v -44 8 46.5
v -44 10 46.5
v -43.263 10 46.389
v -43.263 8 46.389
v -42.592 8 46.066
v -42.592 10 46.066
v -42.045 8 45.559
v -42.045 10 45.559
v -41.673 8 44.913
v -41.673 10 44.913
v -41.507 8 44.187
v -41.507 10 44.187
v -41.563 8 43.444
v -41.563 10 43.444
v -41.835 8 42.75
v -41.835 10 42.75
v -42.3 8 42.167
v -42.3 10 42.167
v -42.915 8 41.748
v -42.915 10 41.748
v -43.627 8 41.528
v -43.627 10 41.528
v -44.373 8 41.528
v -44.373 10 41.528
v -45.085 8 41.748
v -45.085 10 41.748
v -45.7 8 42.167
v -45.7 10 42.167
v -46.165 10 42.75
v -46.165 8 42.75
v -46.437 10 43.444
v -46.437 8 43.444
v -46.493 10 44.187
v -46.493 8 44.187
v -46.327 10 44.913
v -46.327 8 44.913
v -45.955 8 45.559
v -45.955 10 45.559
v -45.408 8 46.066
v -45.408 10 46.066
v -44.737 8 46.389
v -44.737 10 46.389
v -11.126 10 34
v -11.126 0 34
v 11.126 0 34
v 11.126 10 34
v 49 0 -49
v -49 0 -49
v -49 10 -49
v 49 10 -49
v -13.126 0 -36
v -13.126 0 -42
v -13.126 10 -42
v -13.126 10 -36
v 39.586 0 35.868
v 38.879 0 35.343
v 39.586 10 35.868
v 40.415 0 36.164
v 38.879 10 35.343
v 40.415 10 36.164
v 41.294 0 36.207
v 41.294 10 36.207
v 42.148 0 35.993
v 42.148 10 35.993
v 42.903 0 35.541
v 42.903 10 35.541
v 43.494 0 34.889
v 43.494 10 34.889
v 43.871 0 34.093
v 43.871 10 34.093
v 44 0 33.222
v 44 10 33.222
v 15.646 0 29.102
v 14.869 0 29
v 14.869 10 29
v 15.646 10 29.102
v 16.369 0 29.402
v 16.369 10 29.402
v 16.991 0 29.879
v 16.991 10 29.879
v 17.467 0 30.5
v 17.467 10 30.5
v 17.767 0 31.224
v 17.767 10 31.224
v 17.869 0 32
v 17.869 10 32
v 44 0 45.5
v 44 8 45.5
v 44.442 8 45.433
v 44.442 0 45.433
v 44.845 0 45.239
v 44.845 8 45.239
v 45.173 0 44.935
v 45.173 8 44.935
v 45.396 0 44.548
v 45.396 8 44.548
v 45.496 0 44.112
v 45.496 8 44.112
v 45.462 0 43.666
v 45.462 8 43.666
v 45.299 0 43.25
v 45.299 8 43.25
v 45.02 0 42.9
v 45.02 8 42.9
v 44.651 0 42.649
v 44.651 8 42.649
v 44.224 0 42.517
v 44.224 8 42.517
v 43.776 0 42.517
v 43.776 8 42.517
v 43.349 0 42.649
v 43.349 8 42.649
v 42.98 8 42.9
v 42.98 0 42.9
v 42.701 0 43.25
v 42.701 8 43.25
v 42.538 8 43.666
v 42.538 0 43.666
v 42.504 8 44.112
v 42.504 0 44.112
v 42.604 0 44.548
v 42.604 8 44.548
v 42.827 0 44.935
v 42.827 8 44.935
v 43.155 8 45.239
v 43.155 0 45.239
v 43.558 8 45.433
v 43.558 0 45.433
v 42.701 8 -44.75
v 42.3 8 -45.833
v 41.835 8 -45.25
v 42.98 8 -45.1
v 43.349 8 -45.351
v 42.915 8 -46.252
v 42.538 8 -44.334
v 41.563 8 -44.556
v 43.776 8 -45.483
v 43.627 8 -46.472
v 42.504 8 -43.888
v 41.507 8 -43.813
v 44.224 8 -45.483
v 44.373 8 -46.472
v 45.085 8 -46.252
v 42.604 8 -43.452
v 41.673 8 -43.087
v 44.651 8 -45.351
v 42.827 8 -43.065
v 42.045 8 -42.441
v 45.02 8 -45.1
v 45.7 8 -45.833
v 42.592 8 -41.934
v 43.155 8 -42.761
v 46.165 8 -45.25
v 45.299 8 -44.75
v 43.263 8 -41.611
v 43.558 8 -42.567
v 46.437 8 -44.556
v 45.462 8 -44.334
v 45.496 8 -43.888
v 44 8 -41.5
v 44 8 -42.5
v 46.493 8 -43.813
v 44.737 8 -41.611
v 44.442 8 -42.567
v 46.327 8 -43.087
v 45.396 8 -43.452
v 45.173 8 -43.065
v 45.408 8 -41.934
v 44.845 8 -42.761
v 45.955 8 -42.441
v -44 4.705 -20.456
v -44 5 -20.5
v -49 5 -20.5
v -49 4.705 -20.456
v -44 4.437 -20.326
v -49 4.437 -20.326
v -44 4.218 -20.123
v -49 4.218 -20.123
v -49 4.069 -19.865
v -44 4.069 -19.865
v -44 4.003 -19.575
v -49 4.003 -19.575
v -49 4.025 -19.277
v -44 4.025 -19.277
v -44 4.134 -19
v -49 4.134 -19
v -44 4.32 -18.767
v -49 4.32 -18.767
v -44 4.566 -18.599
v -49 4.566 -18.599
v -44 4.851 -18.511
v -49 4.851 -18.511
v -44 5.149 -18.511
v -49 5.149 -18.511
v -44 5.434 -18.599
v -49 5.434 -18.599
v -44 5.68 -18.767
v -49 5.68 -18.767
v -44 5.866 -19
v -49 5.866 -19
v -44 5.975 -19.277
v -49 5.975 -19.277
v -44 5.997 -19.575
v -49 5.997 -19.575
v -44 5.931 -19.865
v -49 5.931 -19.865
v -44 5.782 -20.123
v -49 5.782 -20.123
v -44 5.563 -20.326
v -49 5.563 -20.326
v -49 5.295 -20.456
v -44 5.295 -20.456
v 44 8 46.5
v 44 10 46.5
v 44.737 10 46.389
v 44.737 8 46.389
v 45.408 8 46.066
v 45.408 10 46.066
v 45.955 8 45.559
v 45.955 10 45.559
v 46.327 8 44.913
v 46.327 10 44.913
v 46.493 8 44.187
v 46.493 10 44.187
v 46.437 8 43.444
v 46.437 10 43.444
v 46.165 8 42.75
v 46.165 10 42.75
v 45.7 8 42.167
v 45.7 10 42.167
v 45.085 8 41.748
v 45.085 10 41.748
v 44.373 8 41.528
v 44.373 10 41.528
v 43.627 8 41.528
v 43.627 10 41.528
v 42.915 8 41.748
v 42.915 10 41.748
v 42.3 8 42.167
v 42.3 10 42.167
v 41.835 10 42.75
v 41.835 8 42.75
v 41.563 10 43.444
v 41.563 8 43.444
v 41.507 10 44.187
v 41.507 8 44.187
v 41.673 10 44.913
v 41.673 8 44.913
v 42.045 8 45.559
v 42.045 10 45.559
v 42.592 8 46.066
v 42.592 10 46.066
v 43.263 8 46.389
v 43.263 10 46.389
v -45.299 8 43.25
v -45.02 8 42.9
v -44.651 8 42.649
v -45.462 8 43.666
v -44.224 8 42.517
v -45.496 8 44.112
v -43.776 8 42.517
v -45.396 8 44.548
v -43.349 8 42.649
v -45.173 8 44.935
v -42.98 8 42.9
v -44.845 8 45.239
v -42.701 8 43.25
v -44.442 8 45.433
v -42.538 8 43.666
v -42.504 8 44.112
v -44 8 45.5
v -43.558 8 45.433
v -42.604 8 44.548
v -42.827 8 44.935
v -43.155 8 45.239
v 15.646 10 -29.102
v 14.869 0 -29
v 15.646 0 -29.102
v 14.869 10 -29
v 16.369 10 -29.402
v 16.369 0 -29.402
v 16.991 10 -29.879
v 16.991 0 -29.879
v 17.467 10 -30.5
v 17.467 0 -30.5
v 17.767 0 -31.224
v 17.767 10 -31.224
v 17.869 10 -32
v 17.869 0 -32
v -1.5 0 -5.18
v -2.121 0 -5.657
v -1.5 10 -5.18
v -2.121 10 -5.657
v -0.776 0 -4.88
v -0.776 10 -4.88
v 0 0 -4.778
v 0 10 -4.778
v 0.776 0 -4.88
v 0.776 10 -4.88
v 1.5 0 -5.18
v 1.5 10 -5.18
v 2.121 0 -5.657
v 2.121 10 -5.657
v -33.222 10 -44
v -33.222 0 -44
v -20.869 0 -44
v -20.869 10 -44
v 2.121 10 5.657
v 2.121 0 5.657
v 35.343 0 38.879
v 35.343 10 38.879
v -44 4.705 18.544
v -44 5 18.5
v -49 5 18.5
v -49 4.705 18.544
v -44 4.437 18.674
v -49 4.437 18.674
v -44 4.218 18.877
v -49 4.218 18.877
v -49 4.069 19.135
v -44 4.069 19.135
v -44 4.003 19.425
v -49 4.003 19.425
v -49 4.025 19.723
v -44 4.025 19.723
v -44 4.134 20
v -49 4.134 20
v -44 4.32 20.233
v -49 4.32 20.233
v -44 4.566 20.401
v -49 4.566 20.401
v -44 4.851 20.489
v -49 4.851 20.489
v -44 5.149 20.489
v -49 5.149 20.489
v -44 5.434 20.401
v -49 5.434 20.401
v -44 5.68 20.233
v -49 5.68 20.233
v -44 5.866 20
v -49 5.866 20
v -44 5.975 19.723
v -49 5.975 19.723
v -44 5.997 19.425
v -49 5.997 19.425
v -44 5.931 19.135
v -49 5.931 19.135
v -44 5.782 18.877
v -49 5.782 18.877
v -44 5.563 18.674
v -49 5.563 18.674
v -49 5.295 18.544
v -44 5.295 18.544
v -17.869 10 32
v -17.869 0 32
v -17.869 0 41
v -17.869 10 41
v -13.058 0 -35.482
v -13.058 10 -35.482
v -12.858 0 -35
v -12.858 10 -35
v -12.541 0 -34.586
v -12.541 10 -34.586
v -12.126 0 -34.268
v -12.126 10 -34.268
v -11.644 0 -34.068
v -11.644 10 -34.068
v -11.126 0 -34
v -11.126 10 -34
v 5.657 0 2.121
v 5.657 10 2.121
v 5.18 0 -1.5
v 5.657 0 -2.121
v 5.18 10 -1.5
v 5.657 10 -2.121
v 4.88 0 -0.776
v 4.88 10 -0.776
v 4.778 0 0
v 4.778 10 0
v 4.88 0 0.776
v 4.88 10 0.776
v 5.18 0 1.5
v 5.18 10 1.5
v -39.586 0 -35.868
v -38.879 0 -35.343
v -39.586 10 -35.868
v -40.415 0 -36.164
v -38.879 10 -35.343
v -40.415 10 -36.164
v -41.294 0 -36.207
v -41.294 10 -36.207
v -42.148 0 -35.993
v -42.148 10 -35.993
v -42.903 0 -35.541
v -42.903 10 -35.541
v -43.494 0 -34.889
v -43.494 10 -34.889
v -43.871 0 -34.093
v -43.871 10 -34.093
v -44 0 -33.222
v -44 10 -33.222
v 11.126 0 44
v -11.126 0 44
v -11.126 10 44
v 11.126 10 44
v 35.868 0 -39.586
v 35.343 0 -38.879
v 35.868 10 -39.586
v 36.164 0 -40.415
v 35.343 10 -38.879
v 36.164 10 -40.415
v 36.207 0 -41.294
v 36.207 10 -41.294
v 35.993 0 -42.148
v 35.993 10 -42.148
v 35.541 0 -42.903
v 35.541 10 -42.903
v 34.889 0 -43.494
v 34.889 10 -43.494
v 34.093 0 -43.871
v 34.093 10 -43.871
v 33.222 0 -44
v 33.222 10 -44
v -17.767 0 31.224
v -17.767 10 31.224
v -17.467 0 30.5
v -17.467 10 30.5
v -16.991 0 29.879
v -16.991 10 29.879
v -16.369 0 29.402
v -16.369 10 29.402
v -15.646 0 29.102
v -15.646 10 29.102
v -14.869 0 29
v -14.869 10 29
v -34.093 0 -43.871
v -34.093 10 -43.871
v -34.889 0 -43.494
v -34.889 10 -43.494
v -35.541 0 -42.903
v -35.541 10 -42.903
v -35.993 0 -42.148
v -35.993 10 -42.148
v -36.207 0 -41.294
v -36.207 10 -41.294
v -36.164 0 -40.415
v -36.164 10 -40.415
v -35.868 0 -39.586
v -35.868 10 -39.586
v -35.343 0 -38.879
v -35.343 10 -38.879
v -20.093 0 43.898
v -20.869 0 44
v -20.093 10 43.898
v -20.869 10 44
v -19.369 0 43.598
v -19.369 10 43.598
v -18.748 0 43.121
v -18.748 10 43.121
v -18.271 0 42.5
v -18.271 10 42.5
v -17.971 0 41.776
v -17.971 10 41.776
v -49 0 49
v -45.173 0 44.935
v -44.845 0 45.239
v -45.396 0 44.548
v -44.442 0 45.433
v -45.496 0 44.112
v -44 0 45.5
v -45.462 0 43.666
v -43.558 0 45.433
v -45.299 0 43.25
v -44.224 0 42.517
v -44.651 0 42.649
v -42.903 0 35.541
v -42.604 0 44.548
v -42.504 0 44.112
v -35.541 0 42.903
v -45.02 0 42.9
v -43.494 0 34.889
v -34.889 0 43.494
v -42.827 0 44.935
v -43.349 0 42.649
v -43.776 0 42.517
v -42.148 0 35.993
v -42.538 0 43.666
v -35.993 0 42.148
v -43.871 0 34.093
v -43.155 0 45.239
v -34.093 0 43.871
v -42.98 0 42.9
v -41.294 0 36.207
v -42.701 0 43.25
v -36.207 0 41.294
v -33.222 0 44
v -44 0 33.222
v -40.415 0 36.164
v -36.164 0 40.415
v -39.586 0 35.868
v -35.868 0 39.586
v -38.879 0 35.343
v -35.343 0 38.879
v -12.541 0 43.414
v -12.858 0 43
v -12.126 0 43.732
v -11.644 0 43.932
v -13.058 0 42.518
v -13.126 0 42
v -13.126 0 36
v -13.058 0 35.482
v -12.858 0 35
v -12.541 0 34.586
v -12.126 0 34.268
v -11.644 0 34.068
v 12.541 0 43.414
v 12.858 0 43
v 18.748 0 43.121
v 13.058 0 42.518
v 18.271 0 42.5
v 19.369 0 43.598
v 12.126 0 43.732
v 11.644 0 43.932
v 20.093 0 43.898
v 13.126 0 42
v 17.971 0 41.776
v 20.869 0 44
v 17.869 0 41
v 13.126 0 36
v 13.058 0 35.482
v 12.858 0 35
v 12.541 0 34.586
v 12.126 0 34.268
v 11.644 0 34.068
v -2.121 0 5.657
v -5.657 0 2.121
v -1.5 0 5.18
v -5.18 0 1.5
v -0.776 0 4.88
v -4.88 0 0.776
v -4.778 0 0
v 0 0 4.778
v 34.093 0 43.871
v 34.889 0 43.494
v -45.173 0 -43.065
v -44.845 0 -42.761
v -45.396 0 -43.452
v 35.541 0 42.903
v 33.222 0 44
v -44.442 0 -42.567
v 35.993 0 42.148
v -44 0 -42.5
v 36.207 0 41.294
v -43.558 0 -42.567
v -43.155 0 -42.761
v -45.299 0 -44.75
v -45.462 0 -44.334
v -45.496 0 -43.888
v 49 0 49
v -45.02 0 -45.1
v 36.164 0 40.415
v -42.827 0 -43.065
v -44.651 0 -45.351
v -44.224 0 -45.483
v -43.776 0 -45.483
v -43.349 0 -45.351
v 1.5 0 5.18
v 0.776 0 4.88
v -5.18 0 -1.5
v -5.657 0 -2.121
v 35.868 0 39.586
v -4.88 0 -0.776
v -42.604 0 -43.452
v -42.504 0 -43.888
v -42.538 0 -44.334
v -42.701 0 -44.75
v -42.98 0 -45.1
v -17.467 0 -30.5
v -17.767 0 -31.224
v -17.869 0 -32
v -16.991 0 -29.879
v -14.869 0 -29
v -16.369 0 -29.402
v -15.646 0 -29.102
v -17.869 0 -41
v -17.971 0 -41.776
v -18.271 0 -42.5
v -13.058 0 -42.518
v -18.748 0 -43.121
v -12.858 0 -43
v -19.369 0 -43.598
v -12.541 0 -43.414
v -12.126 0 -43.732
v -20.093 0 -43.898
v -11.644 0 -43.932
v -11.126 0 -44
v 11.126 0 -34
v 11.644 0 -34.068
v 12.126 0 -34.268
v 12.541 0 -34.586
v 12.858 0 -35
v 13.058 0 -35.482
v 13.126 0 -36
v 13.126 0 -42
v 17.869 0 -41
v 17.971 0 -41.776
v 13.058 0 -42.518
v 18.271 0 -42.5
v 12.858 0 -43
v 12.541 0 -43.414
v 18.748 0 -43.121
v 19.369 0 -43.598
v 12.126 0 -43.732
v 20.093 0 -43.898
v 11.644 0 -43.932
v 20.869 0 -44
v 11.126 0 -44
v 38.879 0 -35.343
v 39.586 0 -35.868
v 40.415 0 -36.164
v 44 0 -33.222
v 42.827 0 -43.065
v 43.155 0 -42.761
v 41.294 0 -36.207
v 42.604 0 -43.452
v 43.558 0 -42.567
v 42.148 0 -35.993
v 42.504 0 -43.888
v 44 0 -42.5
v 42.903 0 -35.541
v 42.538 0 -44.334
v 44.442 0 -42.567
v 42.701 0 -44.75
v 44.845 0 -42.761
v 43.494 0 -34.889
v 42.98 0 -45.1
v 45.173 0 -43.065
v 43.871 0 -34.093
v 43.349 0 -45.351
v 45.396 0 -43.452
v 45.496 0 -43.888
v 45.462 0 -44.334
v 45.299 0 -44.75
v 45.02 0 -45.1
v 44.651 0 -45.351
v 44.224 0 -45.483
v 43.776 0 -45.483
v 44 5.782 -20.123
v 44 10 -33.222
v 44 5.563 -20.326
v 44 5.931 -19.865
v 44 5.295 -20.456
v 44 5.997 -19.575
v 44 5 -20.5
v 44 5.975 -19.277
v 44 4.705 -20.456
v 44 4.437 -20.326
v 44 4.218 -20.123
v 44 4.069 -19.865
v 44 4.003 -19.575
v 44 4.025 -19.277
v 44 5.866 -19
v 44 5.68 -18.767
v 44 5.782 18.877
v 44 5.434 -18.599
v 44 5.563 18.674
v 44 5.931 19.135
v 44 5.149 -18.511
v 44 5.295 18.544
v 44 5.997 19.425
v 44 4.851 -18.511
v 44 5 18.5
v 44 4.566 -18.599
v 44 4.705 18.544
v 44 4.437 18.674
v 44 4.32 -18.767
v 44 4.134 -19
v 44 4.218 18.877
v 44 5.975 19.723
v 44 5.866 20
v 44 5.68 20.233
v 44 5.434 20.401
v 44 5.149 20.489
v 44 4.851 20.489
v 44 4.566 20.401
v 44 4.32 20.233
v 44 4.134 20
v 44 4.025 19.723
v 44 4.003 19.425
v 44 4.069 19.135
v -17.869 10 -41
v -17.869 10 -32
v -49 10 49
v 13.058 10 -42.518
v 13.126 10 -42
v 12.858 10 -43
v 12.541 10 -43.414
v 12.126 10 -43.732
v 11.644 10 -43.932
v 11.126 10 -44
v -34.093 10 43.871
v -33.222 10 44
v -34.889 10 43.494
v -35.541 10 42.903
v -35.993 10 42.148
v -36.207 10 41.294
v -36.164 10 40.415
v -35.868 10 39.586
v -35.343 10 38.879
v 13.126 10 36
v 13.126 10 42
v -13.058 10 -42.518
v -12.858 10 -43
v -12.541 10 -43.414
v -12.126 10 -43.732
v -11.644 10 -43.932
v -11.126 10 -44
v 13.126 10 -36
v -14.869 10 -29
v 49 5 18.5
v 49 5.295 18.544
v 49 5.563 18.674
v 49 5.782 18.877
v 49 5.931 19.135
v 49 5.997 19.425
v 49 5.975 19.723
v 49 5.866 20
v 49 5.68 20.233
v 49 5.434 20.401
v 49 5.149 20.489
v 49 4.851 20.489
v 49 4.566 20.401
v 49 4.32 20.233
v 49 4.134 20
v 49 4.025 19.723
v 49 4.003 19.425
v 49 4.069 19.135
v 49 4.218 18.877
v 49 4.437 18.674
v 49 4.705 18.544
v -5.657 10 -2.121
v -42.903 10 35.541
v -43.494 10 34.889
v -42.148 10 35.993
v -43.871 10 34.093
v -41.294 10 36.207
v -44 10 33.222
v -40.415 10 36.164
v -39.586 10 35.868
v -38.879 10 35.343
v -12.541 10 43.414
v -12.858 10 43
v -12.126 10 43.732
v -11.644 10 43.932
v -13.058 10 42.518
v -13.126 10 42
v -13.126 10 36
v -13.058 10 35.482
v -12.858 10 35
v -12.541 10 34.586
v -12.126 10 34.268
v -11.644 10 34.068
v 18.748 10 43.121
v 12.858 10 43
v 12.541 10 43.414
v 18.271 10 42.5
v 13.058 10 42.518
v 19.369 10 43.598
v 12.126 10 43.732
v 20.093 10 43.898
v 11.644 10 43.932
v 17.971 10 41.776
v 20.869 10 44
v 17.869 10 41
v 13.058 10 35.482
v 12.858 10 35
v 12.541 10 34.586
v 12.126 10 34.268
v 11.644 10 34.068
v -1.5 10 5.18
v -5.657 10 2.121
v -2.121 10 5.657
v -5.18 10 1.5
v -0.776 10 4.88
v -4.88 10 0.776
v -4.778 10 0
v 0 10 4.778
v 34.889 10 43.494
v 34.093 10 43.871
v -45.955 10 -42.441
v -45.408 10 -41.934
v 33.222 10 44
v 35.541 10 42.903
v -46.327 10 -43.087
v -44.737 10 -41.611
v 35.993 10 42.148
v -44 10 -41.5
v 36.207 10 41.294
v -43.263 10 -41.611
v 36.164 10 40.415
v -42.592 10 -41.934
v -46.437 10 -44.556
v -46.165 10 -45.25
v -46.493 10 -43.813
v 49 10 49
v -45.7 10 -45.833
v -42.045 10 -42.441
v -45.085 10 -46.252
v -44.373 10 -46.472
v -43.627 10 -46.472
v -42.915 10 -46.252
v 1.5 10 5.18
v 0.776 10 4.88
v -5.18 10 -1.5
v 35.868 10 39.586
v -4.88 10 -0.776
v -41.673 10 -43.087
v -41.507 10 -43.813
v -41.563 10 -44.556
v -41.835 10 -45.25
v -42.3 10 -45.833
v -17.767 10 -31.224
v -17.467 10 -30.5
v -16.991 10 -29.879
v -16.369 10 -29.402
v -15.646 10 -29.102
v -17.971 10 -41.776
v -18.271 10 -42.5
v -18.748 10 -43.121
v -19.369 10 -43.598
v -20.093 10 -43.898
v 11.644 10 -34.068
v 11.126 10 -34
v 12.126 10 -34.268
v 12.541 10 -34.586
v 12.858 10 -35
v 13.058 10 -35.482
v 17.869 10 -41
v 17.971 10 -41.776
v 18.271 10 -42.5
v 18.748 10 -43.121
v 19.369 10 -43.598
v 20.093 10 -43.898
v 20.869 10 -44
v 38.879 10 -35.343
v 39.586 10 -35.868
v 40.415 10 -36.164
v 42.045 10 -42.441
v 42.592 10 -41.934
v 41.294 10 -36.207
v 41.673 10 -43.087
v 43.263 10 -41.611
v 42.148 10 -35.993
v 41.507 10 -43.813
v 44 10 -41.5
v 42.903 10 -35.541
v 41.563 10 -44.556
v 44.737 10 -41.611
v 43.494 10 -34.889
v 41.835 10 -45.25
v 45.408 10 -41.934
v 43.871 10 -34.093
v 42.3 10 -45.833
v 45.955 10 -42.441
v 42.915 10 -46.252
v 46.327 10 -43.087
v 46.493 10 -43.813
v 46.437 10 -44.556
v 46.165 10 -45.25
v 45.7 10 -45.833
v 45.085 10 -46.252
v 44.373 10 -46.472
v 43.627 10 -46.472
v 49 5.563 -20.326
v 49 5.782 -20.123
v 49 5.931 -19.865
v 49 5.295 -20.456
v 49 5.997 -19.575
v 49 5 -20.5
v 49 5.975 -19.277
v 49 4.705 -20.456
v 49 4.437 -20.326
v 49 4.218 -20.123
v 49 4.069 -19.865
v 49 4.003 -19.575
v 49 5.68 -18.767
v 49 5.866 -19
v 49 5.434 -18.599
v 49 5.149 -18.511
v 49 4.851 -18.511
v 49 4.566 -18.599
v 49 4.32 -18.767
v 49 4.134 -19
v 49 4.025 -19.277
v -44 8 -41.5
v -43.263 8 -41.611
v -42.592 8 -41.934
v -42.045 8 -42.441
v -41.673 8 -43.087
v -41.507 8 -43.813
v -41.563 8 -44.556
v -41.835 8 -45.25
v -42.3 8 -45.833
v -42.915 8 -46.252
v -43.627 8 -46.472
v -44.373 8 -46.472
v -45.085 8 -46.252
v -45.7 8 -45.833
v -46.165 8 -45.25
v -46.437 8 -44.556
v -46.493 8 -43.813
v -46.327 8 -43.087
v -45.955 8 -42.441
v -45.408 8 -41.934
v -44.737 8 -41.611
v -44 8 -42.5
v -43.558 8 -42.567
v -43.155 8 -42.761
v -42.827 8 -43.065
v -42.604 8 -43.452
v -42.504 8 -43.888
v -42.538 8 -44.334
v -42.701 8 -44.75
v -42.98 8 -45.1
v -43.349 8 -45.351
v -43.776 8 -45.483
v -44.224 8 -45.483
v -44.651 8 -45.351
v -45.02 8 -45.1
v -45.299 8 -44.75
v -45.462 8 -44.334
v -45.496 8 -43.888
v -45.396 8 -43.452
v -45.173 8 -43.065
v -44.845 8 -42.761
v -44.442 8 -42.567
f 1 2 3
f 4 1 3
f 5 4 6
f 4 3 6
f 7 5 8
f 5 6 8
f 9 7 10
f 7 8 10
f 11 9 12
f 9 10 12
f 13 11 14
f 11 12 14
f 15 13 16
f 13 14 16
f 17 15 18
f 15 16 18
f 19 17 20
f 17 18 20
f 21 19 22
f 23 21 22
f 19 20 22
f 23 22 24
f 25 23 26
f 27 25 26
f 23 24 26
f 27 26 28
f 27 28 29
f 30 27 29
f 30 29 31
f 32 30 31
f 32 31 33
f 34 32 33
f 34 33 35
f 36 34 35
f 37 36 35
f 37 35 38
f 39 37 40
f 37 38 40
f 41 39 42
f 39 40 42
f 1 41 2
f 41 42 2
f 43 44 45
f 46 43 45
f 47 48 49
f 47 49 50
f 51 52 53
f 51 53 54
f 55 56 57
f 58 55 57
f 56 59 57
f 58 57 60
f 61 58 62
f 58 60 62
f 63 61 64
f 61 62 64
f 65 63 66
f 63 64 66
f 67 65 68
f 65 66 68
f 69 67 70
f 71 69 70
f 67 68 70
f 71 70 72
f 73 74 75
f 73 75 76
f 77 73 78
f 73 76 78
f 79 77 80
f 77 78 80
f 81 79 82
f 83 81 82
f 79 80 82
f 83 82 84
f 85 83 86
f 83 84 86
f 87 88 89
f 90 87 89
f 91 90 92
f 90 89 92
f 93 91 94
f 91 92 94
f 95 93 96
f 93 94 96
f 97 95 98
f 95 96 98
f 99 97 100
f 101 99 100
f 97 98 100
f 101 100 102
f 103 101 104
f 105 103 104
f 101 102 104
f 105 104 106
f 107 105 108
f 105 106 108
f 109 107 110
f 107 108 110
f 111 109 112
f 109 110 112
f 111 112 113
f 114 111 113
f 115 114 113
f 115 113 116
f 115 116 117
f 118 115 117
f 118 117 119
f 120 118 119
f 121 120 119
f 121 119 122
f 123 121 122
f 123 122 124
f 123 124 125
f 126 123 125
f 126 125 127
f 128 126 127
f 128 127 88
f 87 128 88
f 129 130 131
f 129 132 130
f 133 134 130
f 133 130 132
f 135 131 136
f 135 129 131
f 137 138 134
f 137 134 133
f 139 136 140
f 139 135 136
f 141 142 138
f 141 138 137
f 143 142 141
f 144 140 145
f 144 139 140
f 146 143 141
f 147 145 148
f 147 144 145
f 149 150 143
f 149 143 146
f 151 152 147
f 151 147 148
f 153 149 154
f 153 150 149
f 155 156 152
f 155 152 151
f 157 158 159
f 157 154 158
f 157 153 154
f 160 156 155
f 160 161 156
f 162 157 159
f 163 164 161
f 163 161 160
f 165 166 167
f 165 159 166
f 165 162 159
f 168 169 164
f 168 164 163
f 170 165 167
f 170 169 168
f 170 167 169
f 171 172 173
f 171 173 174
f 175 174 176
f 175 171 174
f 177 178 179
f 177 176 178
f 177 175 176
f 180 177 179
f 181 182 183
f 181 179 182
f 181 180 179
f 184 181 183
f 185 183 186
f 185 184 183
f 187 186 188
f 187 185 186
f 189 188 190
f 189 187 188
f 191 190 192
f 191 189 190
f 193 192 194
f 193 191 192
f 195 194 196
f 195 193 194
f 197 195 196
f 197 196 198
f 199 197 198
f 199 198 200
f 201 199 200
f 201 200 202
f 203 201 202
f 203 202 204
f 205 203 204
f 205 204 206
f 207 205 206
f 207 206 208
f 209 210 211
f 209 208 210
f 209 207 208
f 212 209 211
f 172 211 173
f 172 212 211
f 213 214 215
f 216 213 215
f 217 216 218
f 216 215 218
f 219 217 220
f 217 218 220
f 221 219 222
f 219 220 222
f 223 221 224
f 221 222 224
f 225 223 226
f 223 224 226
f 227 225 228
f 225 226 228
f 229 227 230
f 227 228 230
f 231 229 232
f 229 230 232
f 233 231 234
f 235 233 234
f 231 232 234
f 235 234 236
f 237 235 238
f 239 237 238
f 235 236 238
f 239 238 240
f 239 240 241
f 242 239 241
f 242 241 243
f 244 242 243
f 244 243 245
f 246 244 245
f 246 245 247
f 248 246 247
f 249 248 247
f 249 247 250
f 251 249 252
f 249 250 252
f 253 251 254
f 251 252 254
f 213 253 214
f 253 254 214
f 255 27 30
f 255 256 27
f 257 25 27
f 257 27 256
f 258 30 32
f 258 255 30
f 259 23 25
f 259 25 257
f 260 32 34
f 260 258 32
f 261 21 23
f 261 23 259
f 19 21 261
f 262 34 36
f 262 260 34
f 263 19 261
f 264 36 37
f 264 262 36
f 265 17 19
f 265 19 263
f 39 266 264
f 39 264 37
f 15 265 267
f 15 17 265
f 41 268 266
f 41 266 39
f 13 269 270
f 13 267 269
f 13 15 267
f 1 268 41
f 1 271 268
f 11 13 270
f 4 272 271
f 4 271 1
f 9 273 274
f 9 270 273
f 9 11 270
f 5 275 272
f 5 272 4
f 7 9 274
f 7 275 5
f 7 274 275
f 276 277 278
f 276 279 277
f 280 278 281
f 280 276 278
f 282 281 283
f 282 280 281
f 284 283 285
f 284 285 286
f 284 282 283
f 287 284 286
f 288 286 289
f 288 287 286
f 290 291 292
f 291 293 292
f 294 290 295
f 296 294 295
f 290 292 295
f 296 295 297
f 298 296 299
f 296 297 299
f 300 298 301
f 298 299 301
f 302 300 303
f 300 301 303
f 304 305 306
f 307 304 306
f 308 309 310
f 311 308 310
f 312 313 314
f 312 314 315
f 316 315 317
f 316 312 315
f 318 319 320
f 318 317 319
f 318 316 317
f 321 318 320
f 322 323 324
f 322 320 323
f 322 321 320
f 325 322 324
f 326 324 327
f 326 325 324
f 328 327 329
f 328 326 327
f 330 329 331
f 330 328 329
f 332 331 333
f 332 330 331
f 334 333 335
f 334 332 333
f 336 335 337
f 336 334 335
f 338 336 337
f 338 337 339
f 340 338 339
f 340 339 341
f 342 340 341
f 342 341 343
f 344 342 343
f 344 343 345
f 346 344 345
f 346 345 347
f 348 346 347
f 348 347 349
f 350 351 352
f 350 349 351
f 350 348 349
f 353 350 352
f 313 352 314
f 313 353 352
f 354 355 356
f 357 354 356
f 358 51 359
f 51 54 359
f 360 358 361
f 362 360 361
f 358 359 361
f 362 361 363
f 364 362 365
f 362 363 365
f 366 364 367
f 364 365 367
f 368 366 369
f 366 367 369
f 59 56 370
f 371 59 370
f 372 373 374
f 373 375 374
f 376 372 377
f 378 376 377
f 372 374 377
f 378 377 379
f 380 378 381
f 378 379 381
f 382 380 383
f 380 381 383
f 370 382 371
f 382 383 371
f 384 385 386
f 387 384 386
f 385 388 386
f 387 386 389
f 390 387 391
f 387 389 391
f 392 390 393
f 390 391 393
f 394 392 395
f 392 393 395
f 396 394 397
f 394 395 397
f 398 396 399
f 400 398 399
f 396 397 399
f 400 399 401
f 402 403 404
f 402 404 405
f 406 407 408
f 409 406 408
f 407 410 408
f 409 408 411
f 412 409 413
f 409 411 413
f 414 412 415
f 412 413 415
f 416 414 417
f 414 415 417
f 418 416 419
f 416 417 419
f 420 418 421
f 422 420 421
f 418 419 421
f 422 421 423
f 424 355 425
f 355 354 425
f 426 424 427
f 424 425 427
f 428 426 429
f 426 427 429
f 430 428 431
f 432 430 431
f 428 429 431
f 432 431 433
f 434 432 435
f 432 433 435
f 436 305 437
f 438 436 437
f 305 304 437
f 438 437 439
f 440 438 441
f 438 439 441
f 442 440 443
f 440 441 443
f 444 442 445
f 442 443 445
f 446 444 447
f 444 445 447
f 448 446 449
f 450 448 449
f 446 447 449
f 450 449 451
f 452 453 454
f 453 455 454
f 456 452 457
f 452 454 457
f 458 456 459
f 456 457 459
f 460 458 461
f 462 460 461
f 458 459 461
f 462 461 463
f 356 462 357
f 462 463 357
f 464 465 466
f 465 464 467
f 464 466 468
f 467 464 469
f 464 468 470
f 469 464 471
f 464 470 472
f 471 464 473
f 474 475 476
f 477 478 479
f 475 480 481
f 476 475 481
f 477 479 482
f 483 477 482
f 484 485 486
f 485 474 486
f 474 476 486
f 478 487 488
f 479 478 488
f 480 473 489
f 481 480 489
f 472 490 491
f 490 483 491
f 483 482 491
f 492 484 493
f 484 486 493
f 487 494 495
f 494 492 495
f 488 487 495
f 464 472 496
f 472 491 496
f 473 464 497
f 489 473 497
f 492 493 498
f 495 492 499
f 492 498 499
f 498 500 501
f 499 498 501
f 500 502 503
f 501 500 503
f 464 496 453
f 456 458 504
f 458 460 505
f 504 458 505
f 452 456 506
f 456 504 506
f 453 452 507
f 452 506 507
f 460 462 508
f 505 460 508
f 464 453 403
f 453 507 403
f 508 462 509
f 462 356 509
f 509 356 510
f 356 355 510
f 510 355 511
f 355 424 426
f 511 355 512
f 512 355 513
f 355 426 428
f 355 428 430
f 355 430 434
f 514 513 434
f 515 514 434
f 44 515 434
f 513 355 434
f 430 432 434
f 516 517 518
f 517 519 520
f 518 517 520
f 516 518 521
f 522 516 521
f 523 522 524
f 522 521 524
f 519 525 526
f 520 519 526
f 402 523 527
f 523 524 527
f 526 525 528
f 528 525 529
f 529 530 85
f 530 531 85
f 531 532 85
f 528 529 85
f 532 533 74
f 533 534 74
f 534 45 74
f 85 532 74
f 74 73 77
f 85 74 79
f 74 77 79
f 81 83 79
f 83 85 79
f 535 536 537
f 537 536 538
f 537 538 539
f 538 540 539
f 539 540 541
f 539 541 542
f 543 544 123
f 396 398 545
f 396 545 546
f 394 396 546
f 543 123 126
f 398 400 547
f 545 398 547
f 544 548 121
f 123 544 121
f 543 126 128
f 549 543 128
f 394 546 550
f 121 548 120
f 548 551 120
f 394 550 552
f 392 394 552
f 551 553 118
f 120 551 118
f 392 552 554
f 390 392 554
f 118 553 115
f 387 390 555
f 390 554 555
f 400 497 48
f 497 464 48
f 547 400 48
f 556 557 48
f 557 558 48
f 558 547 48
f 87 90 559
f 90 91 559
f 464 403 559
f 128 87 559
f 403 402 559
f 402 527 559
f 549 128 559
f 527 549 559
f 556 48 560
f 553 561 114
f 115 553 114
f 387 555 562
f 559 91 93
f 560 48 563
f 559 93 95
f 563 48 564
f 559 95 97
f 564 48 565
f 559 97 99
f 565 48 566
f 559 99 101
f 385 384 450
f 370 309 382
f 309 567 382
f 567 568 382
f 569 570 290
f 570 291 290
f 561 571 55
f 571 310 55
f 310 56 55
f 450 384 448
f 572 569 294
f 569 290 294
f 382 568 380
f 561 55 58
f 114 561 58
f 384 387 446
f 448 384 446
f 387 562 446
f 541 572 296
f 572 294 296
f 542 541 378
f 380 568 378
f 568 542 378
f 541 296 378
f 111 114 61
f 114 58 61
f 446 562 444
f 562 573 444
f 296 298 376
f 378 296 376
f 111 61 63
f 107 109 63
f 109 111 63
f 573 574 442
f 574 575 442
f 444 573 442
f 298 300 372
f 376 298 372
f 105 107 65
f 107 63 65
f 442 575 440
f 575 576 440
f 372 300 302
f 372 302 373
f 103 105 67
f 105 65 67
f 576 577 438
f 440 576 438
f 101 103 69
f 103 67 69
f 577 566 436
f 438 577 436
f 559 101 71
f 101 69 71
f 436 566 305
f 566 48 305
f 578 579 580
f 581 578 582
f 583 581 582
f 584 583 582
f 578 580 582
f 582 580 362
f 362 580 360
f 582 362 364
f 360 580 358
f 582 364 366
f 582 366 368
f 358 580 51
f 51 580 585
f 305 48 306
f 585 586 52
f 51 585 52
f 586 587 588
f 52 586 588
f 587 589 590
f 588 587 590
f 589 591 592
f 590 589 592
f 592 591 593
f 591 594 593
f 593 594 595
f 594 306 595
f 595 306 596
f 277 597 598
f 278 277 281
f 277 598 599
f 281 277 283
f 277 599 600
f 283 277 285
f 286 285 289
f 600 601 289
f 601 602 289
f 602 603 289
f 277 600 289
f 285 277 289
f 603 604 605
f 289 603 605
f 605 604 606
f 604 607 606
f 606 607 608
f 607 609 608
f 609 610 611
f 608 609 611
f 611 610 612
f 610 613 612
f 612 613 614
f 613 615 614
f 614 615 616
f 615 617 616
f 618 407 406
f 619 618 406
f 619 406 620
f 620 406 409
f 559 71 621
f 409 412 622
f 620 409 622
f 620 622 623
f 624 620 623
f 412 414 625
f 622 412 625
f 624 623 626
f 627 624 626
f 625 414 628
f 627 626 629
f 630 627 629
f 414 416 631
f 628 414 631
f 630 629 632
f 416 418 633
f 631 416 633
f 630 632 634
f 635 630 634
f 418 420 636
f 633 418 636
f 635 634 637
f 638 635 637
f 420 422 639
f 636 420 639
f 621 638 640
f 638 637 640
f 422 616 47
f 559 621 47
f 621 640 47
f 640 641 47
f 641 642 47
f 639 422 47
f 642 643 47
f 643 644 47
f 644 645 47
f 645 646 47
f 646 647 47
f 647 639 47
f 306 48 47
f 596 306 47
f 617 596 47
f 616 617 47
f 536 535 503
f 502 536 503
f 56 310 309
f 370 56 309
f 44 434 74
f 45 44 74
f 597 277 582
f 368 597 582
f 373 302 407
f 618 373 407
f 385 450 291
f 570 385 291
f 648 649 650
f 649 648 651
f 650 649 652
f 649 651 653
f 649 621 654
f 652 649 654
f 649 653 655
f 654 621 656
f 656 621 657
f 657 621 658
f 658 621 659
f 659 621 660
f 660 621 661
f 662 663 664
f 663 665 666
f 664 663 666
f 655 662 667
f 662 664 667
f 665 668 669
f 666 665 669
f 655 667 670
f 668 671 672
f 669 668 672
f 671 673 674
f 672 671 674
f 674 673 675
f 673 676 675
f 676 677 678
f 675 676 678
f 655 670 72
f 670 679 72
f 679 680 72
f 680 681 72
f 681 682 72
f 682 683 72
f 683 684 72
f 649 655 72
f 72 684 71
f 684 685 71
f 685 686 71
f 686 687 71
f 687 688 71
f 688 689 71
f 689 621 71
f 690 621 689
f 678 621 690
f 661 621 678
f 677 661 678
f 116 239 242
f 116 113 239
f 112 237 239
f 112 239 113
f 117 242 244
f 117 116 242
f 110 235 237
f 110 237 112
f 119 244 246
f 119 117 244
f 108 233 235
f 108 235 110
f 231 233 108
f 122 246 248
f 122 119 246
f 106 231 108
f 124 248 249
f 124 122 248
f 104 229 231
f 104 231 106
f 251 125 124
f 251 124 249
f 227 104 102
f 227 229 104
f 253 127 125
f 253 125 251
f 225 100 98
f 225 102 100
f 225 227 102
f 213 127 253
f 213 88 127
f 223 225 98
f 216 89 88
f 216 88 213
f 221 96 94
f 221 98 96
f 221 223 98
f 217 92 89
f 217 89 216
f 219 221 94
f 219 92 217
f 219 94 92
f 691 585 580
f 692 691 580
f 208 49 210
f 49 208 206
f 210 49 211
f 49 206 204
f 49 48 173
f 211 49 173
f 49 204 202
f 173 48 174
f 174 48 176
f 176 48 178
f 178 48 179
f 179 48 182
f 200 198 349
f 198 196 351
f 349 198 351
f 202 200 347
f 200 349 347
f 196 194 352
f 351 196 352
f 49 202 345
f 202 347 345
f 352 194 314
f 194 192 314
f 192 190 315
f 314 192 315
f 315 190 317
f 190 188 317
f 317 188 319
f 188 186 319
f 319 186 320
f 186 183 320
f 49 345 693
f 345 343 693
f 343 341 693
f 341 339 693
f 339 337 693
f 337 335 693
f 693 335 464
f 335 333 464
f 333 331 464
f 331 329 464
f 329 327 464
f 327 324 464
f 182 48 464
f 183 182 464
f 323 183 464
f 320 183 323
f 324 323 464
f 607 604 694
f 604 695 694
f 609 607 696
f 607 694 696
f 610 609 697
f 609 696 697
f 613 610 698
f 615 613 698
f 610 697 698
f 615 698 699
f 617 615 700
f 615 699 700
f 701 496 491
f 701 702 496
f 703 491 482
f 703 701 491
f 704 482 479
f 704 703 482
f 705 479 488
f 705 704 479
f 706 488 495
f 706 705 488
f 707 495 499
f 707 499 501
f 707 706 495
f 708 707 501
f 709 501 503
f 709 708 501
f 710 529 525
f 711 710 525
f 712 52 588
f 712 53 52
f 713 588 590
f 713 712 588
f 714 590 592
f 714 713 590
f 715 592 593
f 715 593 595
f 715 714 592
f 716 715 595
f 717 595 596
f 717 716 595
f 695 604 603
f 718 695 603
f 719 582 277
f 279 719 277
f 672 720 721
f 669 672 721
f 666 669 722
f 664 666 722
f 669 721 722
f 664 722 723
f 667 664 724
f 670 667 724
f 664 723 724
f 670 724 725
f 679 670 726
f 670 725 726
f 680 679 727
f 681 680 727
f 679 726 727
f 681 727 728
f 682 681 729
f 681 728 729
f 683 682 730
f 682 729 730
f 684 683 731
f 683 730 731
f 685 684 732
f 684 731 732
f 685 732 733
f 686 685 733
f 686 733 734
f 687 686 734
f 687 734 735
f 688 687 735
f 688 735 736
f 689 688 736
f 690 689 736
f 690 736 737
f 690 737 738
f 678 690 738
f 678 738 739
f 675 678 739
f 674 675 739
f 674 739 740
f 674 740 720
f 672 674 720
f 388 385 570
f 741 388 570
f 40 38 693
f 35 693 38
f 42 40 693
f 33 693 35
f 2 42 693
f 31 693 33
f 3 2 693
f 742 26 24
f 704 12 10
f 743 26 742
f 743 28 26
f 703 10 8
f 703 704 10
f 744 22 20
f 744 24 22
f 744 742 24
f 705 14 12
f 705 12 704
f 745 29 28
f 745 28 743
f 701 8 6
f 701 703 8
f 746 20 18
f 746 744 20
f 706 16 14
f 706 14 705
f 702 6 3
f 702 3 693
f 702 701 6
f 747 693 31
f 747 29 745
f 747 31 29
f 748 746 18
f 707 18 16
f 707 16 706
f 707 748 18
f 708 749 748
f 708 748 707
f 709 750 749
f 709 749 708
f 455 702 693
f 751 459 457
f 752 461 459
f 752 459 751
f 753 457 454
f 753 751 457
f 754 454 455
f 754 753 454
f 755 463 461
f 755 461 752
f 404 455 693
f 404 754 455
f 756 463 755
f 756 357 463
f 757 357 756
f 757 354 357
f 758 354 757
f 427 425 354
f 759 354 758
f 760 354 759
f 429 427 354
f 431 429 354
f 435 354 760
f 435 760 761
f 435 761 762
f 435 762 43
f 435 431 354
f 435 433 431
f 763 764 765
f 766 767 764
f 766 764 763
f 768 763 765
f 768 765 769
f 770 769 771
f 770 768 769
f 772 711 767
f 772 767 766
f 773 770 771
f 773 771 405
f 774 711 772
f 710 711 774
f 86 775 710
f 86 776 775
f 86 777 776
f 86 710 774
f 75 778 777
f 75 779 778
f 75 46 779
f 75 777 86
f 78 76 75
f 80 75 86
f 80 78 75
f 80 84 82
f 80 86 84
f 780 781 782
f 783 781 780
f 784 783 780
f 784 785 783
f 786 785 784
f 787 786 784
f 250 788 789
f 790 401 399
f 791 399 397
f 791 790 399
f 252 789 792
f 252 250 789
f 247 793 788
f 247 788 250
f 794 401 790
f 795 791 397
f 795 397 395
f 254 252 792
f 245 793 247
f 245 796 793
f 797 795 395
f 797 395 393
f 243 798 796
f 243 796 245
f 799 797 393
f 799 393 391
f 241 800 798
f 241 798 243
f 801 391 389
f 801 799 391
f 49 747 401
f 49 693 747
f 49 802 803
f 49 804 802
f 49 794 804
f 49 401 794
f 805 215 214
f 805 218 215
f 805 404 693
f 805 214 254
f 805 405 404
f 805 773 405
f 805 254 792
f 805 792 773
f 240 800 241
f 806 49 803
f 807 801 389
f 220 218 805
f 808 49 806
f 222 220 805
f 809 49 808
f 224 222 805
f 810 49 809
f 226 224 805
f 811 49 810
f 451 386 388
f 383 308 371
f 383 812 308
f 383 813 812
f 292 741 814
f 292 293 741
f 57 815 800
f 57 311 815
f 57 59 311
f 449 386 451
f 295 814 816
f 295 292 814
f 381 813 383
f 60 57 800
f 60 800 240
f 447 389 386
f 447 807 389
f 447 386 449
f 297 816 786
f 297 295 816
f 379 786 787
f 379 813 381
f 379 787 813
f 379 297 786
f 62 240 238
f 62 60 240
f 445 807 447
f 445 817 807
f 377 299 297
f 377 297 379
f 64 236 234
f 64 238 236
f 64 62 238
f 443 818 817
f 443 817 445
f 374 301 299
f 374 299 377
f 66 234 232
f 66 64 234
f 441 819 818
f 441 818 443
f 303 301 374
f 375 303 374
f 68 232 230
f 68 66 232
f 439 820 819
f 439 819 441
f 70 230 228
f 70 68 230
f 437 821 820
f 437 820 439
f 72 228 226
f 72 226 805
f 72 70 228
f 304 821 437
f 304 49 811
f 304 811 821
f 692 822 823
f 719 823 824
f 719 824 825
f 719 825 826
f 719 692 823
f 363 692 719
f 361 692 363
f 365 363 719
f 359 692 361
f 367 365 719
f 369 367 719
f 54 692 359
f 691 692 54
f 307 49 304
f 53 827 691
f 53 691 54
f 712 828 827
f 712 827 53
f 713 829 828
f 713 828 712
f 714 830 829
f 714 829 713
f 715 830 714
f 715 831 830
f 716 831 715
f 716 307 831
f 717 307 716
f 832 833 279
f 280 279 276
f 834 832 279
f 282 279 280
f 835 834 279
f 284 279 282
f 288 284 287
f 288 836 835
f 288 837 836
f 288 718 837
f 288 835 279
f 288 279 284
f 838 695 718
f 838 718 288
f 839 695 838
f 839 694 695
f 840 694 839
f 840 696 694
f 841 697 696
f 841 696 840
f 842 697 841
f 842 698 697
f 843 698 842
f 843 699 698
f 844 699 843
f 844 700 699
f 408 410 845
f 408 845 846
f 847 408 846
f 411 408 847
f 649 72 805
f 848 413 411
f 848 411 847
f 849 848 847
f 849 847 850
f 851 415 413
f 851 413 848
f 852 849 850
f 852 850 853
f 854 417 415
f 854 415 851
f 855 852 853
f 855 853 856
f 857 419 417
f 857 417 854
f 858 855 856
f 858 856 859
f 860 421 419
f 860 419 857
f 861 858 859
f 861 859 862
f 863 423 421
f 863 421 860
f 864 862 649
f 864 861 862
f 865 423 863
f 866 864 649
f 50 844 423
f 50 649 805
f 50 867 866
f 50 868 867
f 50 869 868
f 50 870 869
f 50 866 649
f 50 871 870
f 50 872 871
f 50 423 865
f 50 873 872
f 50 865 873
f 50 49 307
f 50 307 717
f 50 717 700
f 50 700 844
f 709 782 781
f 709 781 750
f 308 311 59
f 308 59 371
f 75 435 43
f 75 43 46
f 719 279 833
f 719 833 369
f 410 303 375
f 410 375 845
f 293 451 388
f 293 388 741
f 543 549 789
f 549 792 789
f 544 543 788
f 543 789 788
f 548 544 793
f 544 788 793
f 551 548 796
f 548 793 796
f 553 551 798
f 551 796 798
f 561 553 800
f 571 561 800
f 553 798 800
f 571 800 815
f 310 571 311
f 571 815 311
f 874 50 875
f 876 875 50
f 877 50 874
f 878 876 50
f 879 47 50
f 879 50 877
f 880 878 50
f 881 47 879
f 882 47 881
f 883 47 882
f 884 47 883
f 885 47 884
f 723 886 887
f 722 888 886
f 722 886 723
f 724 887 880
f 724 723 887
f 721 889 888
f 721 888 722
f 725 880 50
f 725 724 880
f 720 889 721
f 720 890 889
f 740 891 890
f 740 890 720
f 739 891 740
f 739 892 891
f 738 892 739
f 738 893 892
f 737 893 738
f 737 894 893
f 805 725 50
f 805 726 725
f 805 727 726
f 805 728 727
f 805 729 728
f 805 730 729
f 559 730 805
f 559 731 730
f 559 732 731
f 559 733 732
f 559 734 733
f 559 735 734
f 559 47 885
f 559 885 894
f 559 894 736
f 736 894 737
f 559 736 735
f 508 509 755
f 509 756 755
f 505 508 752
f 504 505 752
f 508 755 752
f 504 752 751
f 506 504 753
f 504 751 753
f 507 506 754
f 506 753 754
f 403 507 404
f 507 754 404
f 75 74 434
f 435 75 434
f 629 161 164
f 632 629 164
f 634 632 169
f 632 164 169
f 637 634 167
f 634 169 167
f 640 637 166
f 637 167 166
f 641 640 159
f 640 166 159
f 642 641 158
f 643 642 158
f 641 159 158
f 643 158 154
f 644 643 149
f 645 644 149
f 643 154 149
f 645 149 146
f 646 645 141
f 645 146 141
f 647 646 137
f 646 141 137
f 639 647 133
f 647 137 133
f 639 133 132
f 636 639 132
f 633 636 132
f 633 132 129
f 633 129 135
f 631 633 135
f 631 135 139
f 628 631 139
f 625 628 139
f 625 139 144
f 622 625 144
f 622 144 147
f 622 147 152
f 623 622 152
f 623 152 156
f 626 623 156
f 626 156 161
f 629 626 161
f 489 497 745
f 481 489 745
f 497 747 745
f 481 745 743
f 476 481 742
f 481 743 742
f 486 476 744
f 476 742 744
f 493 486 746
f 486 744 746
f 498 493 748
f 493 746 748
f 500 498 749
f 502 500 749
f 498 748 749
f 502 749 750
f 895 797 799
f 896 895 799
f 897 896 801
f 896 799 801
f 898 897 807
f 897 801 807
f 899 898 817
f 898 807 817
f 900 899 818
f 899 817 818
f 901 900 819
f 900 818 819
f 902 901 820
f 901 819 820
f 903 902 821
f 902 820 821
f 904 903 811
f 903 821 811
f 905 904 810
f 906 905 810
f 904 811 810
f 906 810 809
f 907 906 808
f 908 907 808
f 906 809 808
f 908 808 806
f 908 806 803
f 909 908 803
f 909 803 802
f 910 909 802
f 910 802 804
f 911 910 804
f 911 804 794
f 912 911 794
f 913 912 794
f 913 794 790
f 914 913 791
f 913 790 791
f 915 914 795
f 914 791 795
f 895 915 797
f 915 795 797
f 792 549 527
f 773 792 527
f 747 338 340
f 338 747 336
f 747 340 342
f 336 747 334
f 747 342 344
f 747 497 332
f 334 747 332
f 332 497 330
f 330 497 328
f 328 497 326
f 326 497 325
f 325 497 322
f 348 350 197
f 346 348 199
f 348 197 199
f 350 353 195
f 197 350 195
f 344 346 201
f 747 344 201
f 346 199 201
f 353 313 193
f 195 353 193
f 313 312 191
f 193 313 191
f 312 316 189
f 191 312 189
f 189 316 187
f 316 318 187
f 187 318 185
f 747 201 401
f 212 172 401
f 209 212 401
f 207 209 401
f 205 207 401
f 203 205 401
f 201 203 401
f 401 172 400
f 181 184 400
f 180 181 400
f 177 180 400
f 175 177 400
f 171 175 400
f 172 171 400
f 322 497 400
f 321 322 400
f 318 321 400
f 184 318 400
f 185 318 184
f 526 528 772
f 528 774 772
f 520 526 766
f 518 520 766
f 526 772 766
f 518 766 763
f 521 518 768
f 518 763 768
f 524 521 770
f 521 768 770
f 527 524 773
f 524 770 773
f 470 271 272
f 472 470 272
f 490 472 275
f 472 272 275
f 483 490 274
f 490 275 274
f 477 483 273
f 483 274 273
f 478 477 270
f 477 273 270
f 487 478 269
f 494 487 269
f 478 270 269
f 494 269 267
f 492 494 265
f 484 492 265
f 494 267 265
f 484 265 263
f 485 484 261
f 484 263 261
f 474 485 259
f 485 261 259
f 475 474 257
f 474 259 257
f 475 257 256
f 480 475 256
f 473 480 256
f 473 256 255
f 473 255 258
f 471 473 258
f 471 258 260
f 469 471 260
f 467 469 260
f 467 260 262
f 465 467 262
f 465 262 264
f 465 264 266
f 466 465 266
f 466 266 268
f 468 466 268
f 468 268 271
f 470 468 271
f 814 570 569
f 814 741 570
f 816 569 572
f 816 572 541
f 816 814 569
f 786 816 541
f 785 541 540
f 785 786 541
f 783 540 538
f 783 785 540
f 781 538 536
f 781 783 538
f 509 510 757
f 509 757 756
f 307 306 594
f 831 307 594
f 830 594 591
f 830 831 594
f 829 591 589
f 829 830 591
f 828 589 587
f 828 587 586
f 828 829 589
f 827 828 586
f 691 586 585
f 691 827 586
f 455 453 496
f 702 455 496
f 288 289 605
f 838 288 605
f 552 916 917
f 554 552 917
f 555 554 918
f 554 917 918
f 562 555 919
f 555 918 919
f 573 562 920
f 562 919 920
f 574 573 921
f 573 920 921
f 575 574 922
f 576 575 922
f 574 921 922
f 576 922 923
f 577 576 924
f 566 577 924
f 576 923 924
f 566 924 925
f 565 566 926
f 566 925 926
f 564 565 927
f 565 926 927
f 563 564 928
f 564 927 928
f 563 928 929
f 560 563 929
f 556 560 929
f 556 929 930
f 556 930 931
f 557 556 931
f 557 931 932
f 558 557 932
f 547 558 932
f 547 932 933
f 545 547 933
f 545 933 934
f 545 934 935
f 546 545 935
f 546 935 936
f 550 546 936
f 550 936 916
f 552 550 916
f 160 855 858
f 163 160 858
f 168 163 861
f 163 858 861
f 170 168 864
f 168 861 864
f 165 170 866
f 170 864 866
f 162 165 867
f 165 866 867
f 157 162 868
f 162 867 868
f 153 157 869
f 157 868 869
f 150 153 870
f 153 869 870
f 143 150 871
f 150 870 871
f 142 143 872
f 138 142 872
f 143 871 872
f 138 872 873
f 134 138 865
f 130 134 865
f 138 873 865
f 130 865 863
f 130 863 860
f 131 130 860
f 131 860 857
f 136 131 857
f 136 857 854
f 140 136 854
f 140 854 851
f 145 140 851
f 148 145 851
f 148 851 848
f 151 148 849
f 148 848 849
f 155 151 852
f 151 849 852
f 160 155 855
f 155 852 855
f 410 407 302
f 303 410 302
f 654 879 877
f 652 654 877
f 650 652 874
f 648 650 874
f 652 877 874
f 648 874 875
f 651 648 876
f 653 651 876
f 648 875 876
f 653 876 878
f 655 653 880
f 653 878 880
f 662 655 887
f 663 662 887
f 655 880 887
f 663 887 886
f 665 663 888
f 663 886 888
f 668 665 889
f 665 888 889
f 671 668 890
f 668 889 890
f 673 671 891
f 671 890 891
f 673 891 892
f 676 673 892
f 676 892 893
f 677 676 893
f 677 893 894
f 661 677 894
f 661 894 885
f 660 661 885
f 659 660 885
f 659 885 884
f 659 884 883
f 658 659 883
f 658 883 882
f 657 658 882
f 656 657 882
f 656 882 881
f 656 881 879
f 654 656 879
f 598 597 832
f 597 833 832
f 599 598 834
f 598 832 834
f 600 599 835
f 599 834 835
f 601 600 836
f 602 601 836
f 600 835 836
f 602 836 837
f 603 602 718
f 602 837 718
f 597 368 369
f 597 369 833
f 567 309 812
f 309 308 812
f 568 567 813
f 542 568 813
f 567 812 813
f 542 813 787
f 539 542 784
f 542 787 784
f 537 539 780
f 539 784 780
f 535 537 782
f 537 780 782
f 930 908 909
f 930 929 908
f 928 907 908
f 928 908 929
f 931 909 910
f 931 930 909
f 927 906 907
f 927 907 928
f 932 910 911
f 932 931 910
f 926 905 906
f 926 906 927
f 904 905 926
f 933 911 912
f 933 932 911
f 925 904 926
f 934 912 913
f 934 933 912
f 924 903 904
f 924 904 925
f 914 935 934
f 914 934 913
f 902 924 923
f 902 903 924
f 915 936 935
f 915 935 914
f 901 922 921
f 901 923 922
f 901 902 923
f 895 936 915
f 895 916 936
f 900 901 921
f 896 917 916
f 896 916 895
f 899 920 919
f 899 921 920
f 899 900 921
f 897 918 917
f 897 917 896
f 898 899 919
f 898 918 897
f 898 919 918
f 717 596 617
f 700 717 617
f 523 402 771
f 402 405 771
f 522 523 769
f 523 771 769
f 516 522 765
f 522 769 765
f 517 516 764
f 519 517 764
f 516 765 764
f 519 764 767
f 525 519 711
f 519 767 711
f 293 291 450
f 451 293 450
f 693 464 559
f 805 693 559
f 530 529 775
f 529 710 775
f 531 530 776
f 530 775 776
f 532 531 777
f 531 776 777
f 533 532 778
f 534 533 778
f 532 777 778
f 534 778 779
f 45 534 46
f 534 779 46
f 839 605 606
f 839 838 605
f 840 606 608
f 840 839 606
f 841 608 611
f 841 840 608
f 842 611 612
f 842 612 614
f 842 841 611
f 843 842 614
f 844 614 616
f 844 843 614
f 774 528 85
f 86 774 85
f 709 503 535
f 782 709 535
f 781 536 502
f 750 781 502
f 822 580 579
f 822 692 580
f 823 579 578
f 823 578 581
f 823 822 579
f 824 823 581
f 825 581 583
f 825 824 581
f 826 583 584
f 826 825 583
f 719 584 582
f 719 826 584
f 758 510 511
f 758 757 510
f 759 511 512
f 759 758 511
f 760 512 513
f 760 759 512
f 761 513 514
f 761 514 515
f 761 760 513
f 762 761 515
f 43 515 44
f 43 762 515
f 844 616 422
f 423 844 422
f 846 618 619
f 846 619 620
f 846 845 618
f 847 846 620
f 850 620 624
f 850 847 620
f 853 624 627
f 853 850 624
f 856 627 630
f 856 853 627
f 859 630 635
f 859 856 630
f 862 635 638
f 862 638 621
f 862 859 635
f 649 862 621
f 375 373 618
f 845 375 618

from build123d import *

# Parameters (mm, degrees)
SKETCH1_W           = 106
SKETCH1_H           = 106
BOSS_EXTRUDE1_DEPTH = 10
CUT_EXTRUDE9_DEPTH  = 1.5
SKETCH18_W          = 106
SKETCH18_H          = 106
SKETCH18_W_2        = 100
SKETCH18_H_2        = 100
CUT_EXTRUDE14_DEPTH = 10
SKETCH20_R          = 1
CUT_EXTRUDE15_DEPTH = 8
CUT_EXTRUDE16_START = -8
SKETCH21_R          = 1
CUT_EXTRUDE16_DEPTH = 8
SKETCH23_W          = 100
SKETCH23_H          = 100
SKETCH23_W_2        = 98
SKETCH23_H_2        = 98
CUT_EXTRUDE17_DEPTH = 10
SKETCH17_W          = 26.25282414
SKETCH17_H          = 10
CUT_EXTRUDE19_DEPTH = 10
FILLET2_R           = 3
FILLET3_R           = 3
FILLET4_R           = 2
SKETCH26_R          = 1.5
CUT_EXTRUDE20_DEPTH = 10
SKETCH27_R          = 2.5
CUT_EXTRUDE21_DEPTH = 2


with BuildPart() as part:
    # Sketch1 → Boss-Extrude1 (new body)
    with BuildSketch(Plane(origin=(0, 0, 0), x_dir=(1, 0, 0), z_dir=(0, 1, 0))):
        Rectangle(SKETCH1_W, SKETCH1_H)
    extrude(amount=BOSS_EXTRUDE1_DEPTH)

    # Sketch12 → Cut-Extrude9 (cut)
    with BuildSketch(Plane(origin=(53, 0, 0), x_dir=(0, 0, -1), z_dir=(1, 0, 0))):
        with BuildLine():
            ThreePointArc((-17.75, 5), (-18.262563133, 6.237436867), (-19.5, 6.75))
            Line((-19.5, 6.75), (-19.5, 3.25))
            ThreePointArc((-19.5, 3.25), (-18.262563133, 3.762563133), (-17.75, 5))
        make_face()
        with BuildLine():
            Line((-19.5, 3.25), (-19.5, 6.75))
            ThreePointArc((-19.5, 6.75), (-21.25, 5), (-19.5, 3.25))
        make_face()
        with BuildLine():
            ThreePointArc((21.25, 5), (20.737436867, 6.237436867), (19.5, 6.75))
            Line((19.5, 6.75), (19.5, 3.25))
            ThreePointArc((19.5, 3.25), (20.737436867, 3.762563133), (21.25, 5))
        make_face()
        with BuildLine():
            Line((19.5, 3.25), (19.5, 6.75))
            ThreePointArc((19.5, 6.75), (17.75, 5), (19.5, 3.25))
        make_face()
    extrude(amount=-CUT_EXTRUDE9_DEPTH, mode=Mode.SUBTRACT)

    # Sketch18 → Cut-Extrude14 (cut)
    with BuildSketch(Plane.XZ):
        Rectangle(SKETCH18_W, SKETCH18_H)
        Rectangle(SKETCH18_W_2, SKETCH18_H_2, mode=Mode.SUBTRACT)
    extrude(amount=-CUT_EXTRUDE14_DEPTH, mode=Mode.SUBTRACT)

    # Sketch20 → Cut-Extrude15 (cut)
    with BuildSketch(Plane(origin=(50, 0, 0), x_dir=(0, 0, -1), z_dir=(1, 0, 0))):
        with Locations((19.5, 5)):
            Circle(SKETCH20_R)
        with Locations((-19.5, 5)):
            Circle(SKETCH20_R)
    extrude(amount=-CUT_EXTRUDE15_DEPTH, mode=Mode.SUBTRACT)

    # Sketch21 → Cut-Extrude16 (cut)
    with BuildSketch(Plane.ZY.offset(50).offset(CUT_EXTRUDE16_START)):
        with Locations(Location((19.5, 5, 0), (0, 0, 180))):
            Circle(SKETCH21_R)
        with Locations(Location((-19.5, 5, 0), (0, 0, 180))):
            Circle(SKETCH21_R)
    extrude(amount=CUT_EXTRUDE16_DEPTH, mode=Mode.SUBTRACT)

    # Sketch23 → Cut-Extrude17 (cut)
    with BuildSketch(Plane.XZ):
        Rectangle(SKETCH23_W, SKETCH23_H)
        Rectangle(SKETCH23_W_2, SKETCH23_H_2, mode=Mode.SUBTRACT)
    extrude(amount=-CUT_EXTRUDE17_DEPTH, mode=Mode.SUBTRACT)

    # Sketch17 → Cut-Extrude19 (cut)
    with BuildSketch(Plane.XZ):
        Polygon((-40.464466094, 44), (0, 3.535533906), (40.464466094, 44), (17.869219367, 44), (17.869219367, 29), (-17.869219367, 29), (-17.869219367, 44), align=None)
        with Locations((0, 39)):
            Rectangle(SKETCH17_W, SKETCH17_H)
        Polygon((44, -40.464466094), (44, 40.464466094), (3.535533906, 0), align=None)
        Polygon((-3.535533906, 0), (-44, 40.464466094), (-44, -40.464466094), align=None)
        Polygon((17.869219367, -44), (40.464466094, -44), (0, -3.535533906), (-40.464466094, -44), (-17.869219367, -44), (-17.869219367, -29), (17.869219367, -29), align=None)
        with Locations((0, -39)):
            Rectangle(SKETCH17_W, SKETCH17_H)
    extrude(amount=-CUT_EXTRUDE19_DEPTH, mode=Mode.SUBTRACT)

    # Fillet2
    fillet2_edges = [part.edges().sort_by_distance(p)[0] for p in [
        (40.464466094, 5, 44),
        (0, 5, 3.535533906),
        (-40.464466094, 5, 44),
        (44, 5, 40.464466094),
        (3.535533906, 5, 0),
        (44, 5, -40.464466094),
        (-44, 5, -40.464466094),
        (-44, 5, 40.464466094),
        (-3.535533906, 5, 0),
        (-40.464466094, 5, -44),
        (0, 5, -3.535533906),
        (40.464466094, 5, -44),
    ]]
    fillet(fillet2_edges, radius=FILLET2_R)

    # Fillet3
    fillet3_edges = [part.edges().sort_by_distance(p)[0] for p in [
        (17.869219367, 5, 29),
        (17.869219367, 5, 44),
        (-17.869219367, 5, 44),
        (-17.869219367, 5, 29),
        (17.869219367, 5, -44),
        (17.869219367, 5, -29),
        (-17.869219367, 5, -29),
        (-17.869219367, 5, -44),
    ]]
    fillet(fillet3_edges, radius=FILLET3_R)

    # Fillet4
    fillet4_edges = [part.edges().sort_by_distance(p)[0] for p in [
        (13.12641207, 5, 34),
        (-13.12641207, 5, 34),
        (-13.12641207, 5, 44),
        (13.12641207, 5, 44),
        (13.12641207, 5, -44),
        (-13.12641207, 5, -44),
        (-13.12641207, 5, -34),
        (13.12641207, 5, -34),
    ]]
    fillet(fillet4_edges, radius=FILLET4_R)

    # Sketch26 → Cut-Extrude20 (cut)
    with BuildSketch(Plane(origin=(0, 10, 0), x_dir=(1, 0, 0), z_dir=(0, 1, 0))):
        with Locations(Location((44, -44, 0), (0, 0, 270))):
            Circle(SKETCH26_R)
        with Locations(Location((-44, -44, 0), (0, 0, 270))):
            Circle(SKETCH26_R)
        with Locations(Location((44, 44, 0), (0, 0, 270))):
            Circle(SKETCH26_R)
        with Locations(Location((-44, 44, 0), (0, 0, 270))):
            Circle(SKETCH26_R)
    extrude(amount=-CUT_EXTRUDE20_DEPTH, mode=Mode.SUBTRACT)

    # Sketch27 → Cut-Extrude21 (cut)
    with BuildSketch(Plane(origin=(0, 10, 0), x_dir=(1, 0, 0), z_dir=(0, 1, 0))):
        with Locations(Location((44, -44, 0), (0, 0, 270))):
            Circle(SKETCH27_R)
        with Locations(Location((-44, -44, 0), (0, 0, 270))):
            Circle(SKETCH27_R)
        with Locations(Location((-44, 44, 0), (0, 0, 270))):
            Circle(SKETCH27_R)
        with Locations(Location((44, 44, 0), (0, 0, 270))):
            Circle(SKETCH27_R)
    extrude(amount=-CUT_EXTRUDE21_DEPTH, mode=Mode.SUBTRACT)


solid = part.part
